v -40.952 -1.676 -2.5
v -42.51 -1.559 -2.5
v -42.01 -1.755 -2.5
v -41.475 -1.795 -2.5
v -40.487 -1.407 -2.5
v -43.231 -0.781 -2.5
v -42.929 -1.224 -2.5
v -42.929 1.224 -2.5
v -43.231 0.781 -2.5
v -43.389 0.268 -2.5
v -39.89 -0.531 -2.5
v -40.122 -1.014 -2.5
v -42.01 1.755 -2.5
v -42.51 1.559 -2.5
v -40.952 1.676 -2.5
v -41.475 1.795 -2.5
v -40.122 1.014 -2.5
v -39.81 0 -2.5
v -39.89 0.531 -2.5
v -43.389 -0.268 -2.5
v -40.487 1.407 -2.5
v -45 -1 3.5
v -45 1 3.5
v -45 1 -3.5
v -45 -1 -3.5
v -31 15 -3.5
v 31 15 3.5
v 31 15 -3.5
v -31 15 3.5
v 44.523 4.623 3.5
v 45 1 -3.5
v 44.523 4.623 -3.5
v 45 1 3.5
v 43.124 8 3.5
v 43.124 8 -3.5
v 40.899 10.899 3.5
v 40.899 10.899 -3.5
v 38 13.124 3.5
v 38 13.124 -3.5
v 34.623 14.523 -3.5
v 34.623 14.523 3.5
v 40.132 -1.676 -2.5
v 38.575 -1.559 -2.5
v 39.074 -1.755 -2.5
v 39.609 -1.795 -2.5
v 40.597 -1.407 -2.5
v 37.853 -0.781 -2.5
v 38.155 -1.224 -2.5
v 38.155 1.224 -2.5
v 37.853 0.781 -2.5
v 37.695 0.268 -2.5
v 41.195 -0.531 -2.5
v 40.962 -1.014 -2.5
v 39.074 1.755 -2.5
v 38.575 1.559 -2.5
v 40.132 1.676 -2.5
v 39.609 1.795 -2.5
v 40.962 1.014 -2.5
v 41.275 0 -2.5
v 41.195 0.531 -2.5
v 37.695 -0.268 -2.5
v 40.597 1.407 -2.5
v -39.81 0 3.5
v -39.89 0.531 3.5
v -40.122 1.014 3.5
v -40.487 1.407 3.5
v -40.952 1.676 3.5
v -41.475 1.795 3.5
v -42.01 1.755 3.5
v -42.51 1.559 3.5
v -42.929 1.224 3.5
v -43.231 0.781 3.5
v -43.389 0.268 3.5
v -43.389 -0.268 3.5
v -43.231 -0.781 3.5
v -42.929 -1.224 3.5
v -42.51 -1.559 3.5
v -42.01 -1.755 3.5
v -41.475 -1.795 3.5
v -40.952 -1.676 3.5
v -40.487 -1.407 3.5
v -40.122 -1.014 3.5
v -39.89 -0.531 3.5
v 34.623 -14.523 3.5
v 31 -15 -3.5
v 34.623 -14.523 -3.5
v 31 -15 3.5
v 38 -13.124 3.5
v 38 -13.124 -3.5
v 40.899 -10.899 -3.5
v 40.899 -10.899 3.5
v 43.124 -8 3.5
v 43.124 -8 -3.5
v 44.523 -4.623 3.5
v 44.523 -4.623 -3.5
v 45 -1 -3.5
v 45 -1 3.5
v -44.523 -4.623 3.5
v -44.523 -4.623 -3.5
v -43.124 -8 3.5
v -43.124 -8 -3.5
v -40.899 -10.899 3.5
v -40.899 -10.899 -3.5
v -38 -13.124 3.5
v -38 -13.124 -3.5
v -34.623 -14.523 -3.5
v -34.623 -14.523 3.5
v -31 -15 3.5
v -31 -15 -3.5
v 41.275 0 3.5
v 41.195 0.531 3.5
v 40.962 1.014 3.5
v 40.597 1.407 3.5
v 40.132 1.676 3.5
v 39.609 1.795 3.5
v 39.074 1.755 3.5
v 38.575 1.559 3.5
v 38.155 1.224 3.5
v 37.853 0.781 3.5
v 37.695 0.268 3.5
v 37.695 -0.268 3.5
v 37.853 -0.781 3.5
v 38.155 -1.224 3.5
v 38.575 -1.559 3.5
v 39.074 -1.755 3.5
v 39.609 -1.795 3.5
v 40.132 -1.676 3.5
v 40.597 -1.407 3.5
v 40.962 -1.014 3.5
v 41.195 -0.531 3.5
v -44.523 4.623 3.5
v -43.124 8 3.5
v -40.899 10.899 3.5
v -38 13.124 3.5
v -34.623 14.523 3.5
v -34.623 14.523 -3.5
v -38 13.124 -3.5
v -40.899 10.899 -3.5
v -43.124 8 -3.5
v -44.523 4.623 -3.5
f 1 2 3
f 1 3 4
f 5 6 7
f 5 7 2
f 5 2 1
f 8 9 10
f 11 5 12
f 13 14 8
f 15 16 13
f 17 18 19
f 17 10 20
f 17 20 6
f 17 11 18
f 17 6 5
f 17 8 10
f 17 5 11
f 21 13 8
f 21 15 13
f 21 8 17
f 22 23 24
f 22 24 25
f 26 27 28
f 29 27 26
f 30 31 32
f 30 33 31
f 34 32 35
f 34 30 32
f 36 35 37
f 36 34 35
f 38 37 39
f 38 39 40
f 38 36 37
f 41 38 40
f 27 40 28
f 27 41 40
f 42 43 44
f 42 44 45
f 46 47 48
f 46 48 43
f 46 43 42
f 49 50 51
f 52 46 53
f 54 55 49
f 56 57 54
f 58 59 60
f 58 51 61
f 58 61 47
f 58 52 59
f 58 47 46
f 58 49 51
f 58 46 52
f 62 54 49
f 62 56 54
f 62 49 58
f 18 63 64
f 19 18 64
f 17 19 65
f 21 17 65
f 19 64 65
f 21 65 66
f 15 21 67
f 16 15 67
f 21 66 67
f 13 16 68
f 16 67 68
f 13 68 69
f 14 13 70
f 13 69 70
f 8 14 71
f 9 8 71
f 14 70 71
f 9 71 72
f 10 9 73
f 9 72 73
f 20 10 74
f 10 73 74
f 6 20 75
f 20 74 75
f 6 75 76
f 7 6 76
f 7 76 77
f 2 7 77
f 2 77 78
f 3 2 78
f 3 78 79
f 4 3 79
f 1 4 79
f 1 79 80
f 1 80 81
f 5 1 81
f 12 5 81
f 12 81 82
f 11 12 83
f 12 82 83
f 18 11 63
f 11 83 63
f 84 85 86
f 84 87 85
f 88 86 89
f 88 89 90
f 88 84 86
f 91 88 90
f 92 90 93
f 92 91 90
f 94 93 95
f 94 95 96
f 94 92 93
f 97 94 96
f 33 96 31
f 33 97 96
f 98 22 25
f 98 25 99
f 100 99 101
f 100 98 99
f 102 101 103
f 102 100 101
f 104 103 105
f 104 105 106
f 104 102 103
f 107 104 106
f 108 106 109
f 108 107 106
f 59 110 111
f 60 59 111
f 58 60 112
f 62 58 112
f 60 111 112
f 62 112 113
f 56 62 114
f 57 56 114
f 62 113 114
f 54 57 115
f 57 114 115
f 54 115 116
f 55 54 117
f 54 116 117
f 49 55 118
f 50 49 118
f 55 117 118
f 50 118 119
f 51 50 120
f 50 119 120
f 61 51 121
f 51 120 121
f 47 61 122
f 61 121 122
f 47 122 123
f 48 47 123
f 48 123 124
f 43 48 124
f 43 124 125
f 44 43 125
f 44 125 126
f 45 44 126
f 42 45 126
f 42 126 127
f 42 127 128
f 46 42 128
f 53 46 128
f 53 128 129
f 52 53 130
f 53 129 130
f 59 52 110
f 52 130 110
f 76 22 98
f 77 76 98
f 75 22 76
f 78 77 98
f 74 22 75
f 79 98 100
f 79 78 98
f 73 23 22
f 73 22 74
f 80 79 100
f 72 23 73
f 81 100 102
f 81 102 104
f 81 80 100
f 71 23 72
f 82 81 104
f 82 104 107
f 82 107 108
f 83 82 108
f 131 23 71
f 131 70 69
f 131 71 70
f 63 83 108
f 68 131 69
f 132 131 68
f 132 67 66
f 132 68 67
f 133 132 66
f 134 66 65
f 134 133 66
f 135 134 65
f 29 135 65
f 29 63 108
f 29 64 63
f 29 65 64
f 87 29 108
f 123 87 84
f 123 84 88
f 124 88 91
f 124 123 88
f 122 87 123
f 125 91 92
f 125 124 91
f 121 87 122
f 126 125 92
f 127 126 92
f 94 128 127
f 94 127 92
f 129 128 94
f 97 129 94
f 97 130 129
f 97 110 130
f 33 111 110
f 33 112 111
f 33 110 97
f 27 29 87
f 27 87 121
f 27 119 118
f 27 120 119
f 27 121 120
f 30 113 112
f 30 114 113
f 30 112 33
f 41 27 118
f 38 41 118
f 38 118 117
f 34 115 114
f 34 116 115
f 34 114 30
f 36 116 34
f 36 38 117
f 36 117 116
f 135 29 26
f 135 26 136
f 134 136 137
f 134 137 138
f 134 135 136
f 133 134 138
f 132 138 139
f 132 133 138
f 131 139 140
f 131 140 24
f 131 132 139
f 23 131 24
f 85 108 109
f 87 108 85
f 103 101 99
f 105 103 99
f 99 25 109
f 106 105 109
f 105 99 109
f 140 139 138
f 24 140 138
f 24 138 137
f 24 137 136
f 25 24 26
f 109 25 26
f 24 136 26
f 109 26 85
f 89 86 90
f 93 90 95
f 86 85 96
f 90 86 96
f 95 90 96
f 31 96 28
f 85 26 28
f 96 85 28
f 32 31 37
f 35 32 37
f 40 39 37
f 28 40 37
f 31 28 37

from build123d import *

# Parameters (mm, degrees)
F1_DEPTH = 3.5
F2_R     = 1.8
F3_DEPTH = 6
F4_R     = 1.8
F5_DEPTH = 6


with BuildPart() as f1:
    # F0 (on Top) → F1 (new body, symmetric)
    with BuildSketch(Plane.XY):
        with BuildLine():
            ThreePointArc((45, 1), (40.899495, 10.899495), (31, 15))
            Line((31, 15), (-31, 15))
            ThreePointArc((-31, 15), (-40.899495, 10.899495), (-45, 1))
            Line((-45, 1), (-45, -1))
            ThreePointArc((-45, -1), (-40.899495, -10.899495), (-31, -15))
            Line((-31, -15), (31, -15))
            ThreePointArc((31, -15), (40.899495, -10.899495), (45, -1))
            Line((45, -1), (45, 1))
        make_face()
    extrude(amount=F1_DEPTH, both=True)

    # F2 (on face) → F3 (cut)
    with BuildSketch(Plane.XY.offset(3.5)):
        with Locations((39.474629, 0)):
            Circle(F2_R)
    extrude(amount=-F3_DEPTH, mode=Mode.SUBTRACT)

    # F4 (on face) → F5 (cut)
    with BuildSketch(Plane.XY.offset(3.5)):
        with Locations((-41.609546, 0)):
            Circle(F4_R)
    extrude(amount=-F5_DEPTH, mode=Mode.SUBTRACT)


solid = f1.part
